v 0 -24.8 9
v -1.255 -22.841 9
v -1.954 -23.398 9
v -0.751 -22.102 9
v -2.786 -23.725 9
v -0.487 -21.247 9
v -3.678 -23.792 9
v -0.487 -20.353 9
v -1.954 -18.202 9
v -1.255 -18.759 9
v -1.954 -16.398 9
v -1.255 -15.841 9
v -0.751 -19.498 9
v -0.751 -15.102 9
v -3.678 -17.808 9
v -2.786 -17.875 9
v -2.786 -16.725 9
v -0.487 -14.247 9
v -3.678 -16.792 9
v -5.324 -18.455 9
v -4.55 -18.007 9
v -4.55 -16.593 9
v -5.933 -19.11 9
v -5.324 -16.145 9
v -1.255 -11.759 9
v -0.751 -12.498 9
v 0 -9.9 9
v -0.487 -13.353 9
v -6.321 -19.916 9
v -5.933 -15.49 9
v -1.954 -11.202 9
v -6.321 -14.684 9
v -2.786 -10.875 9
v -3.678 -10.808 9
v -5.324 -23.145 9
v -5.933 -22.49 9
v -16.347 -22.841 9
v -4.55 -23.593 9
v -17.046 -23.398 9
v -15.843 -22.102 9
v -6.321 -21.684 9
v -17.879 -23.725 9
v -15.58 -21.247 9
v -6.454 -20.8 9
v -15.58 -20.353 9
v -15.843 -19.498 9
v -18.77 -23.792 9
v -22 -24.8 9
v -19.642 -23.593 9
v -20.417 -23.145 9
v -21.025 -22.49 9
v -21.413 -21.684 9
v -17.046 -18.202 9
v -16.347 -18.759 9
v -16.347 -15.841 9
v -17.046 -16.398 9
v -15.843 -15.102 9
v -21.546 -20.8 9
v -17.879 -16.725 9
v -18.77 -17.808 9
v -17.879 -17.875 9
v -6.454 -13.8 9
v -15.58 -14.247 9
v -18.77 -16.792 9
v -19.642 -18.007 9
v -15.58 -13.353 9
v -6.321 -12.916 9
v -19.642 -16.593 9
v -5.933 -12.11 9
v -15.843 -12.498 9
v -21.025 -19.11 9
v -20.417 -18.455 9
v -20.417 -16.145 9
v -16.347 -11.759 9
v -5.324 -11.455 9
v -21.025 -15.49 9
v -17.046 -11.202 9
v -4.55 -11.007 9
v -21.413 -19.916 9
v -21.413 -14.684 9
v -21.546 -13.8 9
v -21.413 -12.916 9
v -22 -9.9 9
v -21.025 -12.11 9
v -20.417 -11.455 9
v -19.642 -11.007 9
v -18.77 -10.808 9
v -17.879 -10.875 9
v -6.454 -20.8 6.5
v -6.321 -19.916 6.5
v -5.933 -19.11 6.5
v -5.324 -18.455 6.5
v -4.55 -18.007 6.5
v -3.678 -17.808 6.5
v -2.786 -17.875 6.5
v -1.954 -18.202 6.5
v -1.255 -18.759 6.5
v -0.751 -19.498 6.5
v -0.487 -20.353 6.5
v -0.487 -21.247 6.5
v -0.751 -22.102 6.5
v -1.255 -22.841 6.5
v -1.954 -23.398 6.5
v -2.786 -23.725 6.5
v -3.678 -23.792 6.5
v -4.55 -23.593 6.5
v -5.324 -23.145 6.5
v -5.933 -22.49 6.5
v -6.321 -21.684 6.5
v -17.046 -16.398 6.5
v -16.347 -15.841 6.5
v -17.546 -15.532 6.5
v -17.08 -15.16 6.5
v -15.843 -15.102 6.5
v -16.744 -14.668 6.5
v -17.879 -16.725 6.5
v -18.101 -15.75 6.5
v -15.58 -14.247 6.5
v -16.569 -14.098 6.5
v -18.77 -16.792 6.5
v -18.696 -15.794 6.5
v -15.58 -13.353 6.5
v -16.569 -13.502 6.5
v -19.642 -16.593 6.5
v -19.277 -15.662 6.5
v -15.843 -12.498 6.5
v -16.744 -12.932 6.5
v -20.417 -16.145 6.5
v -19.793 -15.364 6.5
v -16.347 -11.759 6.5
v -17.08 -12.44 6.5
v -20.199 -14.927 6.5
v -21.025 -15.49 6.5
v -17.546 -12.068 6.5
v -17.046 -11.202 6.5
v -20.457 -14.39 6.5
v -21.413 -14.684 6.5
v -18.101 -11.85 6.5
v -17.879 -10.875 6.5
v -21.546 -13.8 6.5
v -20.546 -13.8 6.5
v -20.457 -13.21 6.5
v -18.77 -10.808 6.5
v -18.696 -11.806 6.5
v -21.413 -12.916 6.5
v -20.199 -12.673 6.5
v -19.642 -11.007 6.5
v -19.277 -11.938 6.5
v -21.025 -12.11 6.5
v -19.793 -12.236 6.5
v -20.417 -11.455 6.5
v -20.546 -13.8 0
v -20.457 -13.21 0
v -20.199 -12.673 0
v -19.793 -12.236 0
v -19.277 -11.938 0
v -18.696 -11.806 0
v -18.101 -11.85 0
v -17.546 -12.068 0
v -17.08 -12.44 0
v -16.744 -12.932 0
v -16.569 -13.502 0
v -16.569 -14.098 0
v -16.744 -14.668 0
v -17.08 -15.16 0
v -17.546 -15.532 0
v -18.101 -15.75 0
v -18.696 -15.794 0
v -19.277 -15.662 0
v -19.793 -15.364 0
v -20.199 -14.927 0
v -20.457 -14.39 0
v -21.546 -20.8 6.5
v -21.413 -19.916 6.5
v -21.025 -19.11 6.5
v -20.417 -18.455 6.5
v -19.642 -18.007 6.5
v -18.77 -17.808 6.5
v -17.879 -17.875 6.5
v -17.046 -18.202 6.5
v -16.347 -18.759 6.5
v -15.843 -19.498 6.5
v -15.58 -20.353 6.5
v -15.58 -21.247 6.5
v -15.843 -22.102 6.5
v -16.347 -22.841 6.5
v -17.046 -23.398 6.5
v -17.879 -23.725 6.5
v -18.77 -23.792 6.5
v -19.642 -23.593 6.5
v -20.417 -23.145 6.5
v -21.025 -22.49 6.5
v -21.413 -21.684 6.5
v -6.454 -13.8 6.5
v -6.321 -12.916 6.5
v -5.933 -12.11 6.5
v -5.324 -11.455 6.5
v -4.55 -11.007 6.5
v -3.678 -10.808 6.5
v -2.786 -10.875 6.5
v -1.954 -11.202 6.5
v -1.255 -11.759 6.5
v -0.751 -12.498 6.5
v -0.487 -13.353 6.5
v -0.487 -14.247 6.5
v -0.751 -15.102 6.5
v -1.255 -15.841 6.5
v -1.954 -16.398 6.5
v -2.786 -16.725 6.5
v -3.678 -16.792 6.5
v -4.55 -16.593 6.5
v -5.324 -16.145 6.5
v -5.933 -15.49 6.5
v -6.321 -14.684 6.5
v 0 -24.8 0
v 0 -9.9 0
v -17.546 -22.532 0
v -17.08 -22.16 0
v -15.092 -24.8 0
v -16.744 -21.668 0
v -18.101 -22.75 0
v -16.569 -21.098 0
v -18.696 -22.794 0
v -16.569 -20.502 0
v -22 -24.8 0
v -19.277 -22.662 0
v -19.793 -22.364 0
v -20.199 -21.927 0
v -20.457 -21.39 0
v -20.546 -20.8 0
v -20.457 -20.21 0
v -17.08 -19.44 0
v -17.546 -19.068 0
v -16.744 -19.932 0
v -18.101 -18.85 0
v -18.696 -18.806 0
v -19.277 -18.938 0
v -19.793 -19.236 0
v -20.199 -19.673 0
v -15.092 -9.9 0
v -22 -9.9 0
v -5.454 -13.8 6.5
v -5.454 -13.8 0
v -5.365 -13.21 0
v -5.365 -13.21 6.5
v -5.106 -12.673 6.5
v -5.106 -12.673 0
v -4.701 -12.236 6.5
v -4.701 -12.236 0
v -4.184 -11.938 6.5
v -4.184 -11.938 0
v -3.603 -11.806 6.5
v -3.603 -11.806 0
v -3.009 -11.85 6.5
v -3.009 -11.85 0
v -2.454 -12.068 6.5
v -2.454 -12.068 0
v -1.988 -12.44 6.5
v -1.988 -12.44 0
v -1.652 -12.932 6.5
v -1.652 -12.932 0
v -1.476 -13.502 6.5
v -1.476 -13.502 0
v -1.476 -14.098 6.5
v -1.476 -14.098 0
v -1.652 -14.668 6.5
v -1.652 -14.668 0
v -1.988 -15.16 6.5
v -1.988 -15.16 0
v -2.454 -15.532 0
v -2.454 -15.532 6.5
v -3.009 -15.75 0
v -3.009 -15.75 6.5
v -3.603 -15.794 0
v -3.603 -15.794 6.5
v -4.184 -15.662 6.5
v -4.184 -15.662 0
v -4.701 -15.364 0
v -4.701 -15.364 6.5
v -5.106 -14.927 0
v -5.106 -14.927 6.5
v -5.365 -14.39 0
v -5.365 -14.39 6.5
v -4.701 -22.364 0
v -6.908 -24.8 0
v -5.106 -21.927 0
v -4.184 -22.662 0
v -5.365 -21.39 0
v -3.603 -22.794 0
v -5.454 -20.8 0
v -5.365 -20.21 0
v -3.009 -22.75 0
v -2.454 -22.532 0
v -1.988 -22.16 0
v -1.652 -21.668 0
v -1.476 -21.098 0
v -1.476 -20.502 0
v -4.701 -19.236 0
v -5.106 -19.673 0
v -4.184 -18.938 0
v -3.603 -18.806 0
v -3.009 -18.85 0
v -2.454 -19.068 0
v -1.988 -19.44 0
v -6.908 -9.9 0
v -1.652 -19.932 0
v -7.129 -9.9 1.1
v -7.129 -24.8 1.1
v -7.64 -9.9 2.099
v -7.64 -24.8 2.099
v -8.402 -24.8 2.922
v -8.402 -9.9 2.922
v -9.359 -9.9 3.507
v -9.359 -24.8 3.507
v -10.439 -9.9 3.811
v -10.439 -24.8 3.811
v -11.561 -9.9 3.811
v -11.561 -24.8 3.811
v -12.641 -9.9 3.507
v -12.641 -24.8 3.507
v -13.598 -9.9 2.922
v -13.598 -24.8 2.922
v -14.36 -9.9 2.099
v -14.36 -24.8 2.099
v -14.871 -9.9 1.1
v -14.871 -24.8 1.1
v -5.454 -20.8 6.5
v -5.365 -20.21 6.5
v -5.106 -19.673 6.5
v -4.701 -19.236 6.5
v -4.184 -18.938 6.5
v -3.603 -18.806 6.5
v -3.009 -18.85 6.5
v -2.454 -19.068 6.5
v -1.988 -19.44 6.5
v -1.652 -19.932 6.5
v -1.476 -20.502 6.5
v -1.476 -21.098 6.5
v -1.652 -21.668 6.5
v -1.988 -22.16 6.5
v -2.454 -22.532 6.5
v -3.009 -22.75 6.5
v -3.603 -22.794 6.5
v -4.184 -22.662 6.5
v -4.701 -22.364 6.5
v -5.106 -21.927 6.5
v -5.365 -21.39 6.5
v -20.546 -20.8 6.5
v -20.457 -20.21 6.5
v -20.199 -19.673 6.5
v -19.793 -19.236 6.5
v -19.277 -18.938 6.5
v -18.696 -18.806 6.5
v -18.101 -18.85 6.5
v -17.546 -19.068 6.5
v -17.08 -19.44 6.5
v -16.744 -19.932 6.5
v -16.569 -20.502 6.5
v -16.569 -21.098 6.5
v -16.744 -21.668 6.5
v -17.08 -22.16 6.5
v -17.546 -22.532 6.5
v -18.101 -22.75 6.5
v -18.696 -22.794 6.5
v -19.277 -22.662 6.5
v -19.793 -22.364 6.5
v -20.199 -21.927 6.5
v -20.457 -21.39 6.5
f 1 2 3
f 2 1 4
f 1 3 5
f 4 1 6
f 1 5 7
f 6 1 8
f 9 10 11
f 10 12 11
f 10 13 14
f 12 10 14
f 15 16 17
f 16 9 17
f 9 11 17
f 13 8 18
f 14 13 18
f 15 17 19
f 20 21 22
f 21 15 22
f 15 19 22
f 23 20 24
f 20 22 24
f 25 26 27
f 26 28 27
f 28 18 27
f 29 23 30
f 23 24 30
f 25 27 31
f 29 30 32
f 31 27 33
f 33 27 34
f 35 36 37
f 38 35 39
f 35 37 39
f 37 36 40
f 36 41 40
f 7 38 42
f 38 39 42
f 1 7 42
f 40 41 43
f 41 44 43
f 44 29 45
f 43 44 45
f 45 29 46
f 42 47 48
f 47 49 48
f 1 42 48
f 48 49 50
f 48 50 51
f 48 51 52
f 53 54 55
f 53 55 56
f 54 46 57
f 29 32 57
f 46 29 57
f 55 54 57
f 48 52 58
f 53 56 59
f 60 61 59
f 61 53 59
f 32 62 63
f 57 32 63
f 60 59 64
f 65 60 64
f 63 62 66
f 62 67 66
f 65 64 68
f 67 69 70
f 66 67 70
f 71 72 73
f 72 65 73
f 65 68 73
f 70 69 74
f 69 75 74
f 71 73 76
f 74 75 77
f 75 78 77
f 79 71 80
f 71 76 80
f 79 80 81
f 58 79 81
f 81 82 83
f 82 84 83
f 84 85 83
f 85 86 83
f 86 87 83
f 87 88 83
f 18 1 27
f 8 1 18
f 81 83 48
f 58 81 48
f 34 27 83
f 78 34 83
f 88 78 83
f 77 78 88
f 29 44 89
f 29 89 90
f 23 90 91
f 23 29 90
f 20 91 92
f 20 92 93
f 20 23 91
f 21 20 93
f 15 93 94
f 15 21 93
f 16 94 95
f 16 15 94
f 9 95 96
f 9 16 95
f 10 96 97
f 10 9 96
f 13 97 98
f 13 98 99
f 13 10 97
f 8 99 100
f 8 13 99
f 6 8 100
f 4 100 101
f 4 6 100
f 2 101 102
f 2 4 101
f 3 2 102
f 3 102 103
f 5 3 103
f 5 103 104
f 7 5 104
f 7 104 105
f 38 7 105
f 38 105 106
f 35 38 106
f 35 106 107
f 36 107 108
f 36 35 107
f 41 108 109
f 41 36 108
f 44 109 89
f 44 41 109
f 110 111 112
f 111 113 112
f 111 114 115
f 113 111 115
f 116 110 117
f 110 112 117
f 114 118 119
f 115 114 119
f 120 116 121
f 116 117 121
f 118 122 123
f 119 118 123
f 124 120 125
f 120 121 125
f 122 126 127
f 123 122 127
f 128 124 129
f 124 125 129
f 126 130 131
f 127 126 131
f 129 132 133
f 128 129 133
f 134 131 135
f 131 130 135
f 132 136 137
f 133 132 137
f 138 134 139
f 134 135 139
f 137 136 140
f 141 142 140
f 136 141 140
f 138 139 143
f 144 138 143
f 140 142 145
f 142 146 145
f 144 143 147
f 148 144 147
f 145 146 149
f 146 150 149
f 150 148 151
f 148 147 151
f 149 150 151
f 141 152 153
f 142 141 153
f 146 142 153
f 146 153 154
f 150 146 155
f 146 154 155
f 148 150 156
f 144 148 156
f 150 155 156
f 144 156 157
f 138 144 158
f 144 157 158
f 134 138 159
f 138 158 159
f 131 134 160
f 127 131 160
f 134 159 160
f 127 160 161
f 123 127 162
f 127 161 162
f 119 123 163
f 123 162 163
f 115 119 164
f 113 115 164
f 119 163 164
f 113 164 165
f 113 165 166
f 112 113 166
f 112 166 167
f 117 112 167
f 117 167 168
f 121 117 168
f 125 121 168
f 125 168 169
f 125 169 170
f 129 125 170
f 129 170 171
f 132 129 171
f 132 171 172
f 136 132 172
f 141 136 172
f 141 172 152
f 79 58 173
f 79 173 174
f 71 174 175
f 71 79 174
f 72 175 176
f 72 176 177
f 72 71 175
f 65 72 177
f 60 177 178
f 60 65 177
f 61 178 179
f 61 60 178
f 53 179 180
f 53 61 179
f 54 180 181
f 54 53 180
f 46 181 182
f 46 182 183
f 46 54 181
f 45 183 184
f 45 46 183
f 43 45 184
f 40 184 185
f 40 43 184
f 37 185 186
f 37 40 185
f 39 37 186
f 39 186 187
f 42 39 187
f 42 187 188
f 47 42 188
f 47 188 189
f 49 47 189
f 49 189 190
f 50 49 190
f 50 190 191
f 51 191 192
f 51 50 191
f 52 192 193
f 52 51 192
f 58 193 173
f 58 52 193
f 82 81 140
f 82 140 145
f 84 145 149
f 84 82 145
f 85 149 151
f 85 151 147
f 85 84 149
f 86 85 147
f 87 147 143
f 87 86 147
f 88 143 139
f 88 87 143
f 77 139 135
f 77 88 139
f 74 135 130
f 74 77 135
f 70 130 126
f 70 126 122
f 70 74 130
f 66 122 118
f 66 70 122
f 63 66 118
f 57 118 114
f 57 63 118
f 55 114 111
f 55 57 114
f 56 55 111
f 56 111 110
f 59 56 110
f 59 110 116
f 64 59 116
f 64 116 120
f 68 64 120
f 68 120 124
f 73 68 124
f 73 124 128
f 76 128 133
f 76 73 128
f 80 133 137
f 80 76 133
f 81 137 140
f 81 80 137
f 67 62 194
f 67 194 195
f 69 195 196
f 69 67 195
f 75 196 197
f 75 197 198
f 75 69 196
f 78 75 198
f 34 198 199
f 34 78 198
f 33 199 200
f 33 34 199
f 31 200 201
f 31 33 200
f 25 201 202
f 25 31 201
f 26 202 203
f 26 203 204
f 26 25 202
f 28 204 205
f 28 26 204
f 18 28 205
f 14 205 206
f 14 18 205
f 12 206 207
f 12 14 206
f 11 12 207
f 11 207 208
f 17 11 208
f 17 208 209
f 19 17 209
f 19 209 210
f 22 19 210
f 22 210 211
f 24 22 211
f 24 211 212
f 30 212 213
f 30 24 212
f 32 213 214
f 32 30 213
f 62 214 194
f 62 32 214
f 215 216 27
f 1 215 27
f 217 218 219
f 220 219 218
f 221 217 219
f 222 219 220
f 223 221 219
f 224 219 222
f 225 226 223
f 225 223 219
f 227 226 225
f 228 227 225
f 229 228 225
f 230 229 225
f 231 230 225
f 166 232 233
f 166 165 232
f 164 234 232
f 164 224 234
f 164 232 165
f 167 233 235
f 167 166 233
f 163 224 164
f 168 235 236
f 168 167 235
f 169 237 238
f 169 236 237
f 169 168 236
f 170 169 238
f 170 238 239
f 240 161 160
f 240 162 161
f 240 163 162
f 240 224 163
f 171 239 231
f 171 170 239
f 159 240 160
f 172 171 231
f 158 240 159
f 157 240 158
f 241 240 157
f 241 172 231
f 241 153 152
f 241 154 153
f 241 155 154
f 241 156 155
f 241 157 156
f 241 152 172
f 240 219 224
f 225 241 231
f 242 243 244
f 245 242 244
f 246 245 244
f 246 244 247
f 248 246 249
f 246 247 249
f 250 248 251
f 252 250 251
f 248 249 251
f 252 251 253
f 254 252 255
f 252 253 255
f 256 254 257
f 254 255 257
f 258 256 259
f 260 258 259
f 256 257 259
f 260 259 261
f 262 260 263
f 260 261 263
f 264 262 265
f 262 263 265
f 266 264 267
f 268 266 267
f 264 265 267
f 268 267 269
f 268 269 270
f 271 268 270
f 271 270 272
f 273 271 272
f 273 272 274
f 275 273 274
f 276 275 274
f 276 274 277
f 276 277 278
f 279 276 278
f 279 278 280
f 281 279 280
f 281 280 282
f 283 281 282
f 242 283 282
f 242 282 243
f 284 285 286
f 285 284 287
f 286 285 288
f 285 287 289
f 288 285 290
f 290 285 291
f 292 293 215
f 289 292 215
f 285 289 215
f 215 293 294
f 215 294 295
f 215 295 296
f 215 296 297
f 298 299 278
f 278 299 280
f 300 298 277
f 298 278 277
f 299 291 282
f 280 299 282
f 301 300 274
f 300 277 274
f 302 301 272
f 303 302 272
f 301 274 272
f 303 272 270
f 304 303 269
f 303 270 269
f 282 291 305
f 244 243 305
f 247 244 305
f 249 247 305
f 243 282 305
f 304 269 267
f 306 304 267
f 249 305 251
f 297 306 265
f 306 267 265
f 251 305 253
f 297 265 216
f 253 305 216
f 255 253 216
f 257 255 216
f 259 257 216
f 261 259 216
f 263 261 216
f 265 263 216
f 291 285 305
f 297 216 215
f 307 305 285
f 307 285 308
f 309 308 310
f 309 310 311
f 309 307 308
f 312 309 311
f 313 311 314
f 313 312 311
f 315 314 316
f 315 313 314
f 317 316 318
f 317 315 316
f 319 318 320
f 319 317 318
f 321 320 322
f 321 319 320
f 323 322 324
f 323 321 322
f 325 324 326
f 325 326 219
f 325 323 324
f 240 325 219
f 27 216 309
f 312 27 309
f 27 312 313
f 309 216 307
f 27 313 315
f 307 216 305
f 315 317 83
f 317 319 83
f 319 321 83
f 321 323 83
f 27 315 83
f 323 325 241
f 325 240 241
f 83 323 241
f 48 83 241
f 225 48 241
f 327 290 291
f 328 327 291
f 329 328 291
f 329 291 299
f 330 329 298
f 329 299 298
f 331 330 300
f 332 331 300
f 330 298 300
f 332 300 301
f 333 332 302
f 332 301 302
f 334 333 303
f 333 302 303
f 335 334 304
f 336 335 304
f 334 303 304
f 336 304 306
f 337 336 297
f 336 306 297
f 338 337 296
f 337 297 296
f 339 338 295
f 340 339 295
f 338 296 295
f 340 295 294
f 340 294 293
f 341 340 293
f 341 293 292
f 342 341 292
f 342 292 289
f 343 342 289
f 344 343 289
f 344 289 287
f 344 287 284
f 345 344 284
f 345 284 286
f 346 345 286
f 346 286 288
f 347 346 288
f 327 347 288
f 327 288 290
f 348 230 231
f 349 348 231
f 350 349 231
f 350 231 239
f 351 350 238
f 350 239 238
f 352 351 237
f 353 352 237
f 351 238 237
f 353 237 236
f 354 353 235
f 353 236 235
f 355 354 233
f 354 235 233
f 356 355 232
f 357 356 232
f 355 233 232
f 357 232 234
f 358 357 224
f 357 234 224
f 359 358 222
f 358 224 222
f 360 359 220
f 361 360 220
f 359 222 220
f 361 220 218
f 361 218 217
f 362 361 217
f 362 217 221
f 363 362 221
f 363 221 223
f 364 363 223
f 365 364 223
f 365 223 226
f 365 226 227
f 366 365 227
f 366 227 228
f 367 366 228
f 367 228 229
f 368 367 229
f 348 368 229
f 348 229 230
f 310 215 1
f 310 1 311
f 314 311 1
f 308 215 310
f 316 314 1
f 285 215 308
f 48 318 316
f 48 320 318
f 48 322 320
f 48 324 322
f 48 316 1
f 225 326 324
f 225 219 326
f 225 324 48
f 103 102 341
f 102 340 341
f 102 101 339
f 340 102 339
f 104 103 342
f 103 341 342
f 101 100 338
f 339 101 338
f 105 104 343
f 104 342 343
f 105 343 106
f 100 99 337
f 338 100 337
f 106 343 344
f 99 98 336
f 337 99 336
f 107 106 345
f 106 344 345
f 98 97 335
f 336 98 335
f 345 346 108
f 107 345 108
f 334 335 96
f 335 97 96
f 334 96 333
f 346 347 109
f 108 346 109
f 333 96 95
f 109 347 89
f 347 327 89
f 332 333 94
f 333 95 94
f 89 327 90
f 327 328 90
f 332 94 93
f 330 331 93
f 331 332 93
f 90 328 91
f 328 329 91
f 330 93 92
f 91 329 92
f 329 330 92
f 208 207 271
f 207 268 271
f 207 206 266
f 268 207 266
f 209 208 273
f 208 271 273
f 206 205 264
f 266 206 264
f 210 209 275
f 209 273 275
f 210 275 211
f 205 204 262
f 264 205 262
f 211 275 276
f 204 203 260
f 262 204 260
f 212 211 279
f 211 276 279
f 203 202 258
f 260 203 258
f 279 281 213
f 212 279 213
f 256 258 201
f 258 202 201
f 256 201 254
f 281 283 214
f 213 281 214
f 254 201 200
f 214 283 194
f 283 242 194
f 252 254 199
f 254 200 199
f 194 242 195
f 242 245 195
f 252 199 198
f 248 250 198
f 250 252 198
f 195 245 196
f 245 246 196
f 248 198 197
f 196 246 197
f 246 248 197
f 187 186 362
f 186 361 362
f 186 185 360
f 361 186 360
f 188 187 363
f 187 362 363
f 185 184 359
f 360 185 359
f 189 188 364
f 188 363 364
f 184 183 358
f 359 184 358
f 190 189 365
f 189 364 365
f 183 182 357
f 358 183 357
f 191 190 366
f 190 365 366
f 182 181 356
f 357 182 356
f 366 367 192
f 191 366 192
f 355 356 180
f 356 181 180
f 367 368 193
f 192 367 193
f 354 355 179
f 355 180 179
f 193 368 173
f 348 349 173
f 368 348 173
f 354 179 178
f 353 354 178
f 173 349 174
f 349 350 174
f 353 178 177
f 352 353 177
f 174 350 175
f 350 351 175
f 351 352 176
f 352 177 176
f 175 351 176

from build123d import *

# Parameters (mm, degrees)
PAD016_DEPTH            = 14.9
SKETCH037_R             = 2
POCKET017_DEPTH         = 9.251
SKETCH038_R             = 3
POCKET018_DEPTH         = 2.5
BODY022_PLACEMENT_ANGLE = 180


with BuildPart() as part:
    # Sketch036 (on DatumPlane) → Pad016 (new body)
    with BuildSketch(Plane.XZ.offset(9.9)):
        with BuildLine():
            Line((-22, -0.25), (-22, -9.25))
            Line((-22, -9.25), (0, -9.25))
            Line((0, -9.25), (0, -0.25))
            Line((-6.907629, -0.25), (0, -0.25))
            ThreePointArc((-15.092371, -0.25), (-11, -4.1), (-6.907629, -0.25))
            Line((-15.092371, -0.25), (-22, -0.25))
        make_face()
    extrude(amount=PAD016_DEPTH)

    # Sketch037 → Pocket017 (cut, through all)
    with BuildSketch(Plane.XY):
        with Locations((-18.546185, -13.8)):
            Circle(SKETCH037_R)
        with Locations((-18.546185, -20.8)):
            Circle(SKETCH037_R)
        with Locations((-3.453815, -20.8)):
            Circle(SKETCH037_R)
        with Locations((-3.453815, -13.8)):
            Circle(SKETCH037_R)
    extrude(amount=-POCKET017_DEPTH, mode=Mode.SUBTRACT)

    # Sketch038 (on DatumPlane) → Pocket018 (cut)
    with BuildSketch(Plane.XY.offset(-9.25)):
        with Locations((-18.546185, -13.8)):
            Circle(SKETCH038_R)
        with Locations((-18.546185, -20.8)):
            Circle(SKETCH038_R)
        with Locations((-3.453815, -13.8)):
            Circle(SKETCH038_R)
        with Locations((-3.453815, -20.8)):
            Circle(SKETCH038_R)
    extrude(amount=POCKET018_DEPTH, mode=Mode.SUBTRACT)


with BuildPart() as part_1:
    # Body022 placement: moved
    add(part.part.moved(Location((-22, 0, -0.25))).rotate(Axis((-22, 0, -0.25), (0, 1, 0)), BODY022_PLACEMENT_ANGLE))


solid = part_1.part
